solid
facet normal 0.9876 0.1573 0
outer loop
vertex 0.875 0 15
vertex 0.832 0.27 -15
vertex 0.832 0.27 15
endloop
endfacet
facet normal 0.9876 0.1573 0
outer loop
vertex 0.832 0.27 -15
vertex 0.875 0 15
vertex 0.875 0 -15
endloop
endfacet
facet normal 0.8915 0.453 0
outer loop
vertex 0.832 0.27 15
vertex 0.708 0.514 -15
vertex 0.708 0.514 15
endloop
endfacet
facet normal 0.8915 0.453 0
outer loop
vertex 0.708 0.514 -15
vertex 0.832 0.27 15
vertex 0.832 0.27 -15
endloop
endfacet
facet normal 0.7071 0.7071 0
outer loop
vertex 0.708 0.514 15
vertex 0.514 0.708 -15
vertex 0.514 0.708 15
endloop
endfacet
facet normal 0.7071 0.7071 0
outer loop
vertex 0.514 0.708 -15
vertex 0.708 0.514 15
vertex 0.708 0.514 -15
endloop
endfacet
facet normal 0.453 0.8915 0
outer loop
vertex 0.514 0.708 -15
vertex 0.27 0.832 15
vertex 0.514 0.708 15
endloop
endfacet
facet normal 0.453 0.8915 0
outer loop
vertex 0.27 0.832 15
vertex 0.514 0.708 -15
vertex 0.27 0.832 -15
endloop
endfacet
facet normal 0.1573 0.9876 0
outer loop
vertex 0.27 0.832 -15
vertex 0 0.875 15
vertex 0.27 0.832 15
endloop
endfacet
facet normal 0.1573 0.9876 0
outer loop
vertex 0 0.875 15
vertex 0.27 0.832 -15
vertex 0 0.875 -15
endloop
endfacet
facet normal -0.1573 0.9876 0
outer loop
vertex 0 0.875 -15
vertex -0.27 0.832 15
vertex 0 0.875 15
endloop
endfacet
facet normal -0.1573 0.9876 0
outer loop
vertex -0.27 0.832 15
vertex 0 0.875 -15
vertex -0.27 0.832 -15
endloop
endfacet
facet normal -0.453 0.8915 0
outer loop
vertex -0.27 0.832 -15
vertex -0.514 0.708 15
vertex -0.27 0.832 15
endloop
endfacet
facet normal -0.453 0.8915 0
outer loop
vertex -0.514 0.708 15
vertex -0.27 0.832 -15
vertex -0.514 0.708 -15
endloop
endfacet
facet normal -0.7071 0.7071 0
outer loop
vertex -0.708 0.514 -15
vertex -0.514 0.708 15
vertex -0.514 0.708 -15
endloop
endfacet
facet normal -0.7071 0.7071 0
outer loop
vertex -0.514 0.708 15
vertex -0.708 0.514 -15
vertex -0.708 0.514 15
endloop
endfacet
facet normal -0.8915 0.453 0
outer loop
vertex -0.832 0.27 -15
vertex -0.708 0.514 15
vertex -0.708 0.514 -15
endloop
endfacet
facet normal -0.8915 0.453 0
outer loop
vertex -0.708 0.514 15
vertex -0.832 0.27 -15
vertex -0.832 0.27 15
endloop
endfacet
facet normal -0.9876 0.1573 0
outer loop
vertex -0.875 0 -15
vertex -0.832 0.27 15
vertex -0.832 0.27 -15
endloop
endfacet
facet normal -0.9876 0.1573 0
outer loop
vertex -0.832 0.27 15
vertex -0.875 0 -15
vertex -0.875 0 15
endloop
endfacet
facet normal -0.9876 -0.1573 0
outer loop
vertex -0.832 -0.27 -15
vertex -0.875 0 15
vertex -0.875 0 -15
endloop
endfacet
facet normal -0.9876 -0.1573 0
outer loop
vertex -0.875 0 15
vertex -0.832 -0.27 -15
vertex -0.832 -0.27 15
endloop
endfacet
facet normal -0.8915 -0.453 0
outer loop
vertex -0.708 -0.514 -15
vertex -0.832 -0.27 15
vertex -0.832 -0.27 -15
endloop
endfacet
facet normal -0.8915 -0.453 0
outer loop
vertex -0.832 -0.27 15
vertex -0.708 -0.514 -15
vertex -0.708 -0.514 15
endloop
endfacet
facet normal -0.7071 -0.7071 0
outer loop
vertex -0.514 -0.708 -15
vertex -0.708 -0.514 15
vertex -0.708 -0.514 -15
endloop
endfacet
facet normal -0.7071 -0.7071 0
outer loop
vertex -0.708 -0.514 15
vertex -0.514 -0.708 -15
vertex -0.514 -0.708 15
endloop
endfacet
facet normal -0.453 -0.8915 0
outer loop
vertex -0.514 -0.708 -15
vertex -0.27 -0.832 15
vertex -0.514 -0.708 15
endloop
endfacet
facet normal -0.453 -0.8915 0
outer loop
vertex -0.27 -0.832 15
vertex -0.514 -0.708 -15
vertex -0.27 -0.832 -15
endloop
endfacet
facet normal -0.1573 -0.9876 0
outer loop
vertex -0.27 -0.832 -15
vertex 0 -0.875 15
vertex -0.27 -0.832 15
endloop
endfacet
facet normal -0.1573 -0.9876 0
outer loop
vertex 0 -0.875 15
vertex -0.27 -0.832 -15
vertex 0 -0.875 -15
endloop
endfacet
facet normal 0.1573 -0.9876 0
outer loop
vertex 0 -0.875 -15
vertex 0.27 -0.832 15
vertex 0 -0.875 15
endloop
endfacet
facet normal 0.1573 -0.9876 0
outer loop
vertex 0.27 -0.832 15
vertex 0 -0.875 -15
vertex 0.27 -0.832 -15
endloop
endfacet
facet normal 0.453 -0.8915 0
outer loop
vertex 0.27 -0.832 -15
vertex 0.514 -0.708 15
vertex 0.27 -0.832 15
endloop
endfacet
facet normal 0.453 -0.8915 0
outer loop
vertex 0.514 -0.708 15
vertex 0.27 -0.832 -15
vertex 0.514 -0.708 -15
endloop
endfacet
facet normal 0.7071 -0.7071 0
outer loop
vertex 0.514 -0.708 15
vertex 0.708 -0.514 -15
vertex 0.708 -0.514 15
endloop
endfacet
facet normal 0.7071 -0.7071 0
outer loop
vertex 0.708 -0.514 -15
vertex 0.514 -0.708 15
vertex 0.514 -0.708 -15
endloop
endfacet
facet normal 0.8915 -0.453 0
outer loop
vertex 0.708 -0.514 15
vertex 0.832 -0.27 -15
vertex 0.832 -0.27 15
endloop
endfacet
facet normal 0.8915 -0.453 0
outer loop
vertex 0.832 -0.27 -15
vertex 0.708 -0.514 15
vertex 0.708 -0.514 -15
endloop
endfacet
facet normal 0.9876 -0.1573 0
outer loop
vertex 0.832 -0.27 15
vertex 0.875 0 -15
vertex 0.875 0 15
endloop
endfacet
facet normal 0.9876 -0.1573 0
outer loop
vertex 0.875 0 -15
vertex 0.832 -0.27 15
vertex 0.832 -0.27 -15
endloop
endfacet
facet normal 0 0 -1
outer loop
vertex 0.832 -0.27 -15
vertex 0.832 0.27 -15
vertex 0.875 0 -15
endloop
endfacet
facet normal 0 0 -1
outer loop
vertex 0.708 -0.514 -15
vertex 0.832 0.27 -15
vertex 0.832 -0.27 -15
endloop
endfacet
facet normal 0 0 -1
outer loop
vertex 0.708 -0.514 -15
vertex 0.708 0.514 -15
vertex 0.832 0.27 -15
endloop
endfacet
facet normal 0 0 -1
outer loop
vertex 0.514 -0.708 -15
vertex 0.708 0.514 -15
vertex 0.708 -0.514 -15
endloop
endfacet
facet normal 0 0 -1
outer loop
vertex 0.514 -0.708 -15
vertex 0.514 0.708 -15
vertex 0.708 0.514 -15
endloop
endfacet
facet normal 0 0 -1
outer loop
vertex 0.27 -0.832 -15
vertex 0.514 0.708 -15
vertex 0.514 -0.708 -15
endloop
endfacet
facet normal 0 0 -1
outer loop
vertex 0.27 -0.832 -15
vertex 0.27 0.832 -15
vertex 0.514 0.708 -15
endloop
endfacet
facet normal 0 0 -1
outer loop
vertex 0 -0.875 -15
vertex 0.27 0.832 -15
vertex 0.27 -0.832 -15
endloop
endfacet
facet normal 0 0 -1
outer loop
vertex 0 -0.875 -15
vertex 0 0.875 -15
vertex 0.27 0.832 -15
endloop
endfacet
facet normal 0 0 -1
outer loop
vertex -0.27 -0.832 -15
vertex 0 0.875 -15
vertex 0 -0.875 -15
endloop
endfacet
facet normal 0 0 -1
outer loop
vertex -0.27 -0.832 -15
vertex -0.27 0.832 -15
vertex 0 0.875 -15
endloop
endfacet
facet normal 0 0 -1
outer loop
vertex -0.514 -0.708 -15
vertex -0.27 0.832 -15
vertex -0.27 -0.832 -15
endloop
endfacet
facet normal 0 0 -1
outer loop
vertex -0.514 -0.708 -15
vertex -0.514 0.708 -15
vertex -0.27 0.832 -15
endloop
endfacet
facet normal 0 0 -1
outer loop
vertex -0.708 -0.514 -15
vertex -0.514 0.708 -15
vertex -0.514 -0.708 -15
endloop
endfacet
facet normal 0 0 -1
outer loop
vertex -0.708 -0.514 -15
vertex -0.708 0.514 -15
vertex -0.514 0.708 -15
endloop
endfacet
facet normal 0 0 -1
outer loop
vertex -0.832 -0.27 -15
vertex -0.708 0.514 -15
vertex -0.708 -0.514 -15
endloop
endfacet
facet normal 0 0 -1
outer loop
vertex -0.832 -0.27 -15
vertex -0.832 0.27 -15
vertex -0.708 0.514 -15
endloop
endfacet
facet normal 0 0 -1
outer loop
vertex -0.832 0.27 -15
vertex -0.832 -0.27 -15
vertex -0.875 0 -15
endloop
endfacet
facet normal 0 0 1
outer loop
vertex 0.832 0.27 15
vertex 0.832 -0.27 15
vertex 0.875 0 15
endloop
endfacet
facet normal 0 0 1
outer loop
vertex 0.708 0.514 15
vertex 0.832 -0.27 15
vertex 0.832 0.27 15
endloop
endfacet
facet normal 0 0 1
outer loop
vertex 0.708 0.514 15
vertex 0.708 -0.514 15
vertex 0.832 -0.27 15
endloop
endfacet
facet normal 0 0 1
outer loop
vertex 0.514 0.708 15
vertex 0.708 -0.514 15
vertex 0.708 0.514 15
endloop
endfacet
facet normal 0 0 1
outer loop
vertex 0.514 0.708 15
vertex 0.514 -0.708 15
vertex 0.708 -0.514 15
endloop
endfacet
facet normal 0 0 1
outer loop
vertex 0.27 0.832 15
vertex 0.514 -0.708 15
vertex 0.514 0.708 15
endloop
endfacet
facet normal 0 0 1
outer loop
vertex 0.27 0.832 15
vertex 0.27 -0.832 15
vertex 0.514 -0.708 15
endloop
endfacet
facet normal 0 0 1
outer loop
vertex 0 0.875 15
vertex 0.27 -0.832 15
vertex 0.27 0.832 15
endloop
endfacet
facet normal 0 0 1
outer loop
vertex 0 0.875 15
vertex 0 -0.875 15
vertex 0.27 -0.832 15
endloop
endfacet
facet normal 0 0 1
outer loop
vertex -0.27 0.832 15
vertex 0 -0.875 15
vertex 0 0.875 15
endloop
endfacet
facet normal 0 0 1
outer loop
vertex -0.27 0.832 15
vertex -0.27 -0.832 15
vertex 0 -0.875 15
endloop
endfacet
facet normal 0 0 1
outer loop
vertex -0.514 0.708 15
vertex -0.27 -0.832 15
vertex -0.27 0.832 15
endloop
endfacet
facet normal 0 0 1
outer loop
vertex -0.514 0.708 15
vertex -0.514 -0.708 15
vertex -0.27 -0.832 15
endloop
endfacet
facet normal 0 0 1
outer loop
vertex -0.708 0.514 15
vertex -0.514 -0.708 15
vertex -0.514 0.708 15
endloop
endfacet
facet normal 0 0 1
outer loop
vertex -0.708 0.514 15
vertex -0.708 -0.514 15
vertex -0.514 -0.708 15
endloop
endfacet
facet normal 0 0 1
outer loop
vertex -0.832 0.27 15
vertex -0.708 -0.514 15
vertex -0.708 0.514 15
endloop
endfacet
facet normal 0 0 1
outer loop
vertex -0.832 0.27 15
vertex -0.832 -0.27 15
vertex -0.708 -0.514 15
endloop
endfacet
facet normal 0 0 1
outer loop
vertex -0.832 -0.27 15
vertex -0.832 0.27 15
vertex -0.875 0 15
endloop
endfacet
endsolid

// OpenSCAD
// NAME: Filament 30 mm
// COLOR: 80
// CATEGORY: Support

color("darkorange")
    cylinder(d=1.75, h=30, center=true, $fn=20);
